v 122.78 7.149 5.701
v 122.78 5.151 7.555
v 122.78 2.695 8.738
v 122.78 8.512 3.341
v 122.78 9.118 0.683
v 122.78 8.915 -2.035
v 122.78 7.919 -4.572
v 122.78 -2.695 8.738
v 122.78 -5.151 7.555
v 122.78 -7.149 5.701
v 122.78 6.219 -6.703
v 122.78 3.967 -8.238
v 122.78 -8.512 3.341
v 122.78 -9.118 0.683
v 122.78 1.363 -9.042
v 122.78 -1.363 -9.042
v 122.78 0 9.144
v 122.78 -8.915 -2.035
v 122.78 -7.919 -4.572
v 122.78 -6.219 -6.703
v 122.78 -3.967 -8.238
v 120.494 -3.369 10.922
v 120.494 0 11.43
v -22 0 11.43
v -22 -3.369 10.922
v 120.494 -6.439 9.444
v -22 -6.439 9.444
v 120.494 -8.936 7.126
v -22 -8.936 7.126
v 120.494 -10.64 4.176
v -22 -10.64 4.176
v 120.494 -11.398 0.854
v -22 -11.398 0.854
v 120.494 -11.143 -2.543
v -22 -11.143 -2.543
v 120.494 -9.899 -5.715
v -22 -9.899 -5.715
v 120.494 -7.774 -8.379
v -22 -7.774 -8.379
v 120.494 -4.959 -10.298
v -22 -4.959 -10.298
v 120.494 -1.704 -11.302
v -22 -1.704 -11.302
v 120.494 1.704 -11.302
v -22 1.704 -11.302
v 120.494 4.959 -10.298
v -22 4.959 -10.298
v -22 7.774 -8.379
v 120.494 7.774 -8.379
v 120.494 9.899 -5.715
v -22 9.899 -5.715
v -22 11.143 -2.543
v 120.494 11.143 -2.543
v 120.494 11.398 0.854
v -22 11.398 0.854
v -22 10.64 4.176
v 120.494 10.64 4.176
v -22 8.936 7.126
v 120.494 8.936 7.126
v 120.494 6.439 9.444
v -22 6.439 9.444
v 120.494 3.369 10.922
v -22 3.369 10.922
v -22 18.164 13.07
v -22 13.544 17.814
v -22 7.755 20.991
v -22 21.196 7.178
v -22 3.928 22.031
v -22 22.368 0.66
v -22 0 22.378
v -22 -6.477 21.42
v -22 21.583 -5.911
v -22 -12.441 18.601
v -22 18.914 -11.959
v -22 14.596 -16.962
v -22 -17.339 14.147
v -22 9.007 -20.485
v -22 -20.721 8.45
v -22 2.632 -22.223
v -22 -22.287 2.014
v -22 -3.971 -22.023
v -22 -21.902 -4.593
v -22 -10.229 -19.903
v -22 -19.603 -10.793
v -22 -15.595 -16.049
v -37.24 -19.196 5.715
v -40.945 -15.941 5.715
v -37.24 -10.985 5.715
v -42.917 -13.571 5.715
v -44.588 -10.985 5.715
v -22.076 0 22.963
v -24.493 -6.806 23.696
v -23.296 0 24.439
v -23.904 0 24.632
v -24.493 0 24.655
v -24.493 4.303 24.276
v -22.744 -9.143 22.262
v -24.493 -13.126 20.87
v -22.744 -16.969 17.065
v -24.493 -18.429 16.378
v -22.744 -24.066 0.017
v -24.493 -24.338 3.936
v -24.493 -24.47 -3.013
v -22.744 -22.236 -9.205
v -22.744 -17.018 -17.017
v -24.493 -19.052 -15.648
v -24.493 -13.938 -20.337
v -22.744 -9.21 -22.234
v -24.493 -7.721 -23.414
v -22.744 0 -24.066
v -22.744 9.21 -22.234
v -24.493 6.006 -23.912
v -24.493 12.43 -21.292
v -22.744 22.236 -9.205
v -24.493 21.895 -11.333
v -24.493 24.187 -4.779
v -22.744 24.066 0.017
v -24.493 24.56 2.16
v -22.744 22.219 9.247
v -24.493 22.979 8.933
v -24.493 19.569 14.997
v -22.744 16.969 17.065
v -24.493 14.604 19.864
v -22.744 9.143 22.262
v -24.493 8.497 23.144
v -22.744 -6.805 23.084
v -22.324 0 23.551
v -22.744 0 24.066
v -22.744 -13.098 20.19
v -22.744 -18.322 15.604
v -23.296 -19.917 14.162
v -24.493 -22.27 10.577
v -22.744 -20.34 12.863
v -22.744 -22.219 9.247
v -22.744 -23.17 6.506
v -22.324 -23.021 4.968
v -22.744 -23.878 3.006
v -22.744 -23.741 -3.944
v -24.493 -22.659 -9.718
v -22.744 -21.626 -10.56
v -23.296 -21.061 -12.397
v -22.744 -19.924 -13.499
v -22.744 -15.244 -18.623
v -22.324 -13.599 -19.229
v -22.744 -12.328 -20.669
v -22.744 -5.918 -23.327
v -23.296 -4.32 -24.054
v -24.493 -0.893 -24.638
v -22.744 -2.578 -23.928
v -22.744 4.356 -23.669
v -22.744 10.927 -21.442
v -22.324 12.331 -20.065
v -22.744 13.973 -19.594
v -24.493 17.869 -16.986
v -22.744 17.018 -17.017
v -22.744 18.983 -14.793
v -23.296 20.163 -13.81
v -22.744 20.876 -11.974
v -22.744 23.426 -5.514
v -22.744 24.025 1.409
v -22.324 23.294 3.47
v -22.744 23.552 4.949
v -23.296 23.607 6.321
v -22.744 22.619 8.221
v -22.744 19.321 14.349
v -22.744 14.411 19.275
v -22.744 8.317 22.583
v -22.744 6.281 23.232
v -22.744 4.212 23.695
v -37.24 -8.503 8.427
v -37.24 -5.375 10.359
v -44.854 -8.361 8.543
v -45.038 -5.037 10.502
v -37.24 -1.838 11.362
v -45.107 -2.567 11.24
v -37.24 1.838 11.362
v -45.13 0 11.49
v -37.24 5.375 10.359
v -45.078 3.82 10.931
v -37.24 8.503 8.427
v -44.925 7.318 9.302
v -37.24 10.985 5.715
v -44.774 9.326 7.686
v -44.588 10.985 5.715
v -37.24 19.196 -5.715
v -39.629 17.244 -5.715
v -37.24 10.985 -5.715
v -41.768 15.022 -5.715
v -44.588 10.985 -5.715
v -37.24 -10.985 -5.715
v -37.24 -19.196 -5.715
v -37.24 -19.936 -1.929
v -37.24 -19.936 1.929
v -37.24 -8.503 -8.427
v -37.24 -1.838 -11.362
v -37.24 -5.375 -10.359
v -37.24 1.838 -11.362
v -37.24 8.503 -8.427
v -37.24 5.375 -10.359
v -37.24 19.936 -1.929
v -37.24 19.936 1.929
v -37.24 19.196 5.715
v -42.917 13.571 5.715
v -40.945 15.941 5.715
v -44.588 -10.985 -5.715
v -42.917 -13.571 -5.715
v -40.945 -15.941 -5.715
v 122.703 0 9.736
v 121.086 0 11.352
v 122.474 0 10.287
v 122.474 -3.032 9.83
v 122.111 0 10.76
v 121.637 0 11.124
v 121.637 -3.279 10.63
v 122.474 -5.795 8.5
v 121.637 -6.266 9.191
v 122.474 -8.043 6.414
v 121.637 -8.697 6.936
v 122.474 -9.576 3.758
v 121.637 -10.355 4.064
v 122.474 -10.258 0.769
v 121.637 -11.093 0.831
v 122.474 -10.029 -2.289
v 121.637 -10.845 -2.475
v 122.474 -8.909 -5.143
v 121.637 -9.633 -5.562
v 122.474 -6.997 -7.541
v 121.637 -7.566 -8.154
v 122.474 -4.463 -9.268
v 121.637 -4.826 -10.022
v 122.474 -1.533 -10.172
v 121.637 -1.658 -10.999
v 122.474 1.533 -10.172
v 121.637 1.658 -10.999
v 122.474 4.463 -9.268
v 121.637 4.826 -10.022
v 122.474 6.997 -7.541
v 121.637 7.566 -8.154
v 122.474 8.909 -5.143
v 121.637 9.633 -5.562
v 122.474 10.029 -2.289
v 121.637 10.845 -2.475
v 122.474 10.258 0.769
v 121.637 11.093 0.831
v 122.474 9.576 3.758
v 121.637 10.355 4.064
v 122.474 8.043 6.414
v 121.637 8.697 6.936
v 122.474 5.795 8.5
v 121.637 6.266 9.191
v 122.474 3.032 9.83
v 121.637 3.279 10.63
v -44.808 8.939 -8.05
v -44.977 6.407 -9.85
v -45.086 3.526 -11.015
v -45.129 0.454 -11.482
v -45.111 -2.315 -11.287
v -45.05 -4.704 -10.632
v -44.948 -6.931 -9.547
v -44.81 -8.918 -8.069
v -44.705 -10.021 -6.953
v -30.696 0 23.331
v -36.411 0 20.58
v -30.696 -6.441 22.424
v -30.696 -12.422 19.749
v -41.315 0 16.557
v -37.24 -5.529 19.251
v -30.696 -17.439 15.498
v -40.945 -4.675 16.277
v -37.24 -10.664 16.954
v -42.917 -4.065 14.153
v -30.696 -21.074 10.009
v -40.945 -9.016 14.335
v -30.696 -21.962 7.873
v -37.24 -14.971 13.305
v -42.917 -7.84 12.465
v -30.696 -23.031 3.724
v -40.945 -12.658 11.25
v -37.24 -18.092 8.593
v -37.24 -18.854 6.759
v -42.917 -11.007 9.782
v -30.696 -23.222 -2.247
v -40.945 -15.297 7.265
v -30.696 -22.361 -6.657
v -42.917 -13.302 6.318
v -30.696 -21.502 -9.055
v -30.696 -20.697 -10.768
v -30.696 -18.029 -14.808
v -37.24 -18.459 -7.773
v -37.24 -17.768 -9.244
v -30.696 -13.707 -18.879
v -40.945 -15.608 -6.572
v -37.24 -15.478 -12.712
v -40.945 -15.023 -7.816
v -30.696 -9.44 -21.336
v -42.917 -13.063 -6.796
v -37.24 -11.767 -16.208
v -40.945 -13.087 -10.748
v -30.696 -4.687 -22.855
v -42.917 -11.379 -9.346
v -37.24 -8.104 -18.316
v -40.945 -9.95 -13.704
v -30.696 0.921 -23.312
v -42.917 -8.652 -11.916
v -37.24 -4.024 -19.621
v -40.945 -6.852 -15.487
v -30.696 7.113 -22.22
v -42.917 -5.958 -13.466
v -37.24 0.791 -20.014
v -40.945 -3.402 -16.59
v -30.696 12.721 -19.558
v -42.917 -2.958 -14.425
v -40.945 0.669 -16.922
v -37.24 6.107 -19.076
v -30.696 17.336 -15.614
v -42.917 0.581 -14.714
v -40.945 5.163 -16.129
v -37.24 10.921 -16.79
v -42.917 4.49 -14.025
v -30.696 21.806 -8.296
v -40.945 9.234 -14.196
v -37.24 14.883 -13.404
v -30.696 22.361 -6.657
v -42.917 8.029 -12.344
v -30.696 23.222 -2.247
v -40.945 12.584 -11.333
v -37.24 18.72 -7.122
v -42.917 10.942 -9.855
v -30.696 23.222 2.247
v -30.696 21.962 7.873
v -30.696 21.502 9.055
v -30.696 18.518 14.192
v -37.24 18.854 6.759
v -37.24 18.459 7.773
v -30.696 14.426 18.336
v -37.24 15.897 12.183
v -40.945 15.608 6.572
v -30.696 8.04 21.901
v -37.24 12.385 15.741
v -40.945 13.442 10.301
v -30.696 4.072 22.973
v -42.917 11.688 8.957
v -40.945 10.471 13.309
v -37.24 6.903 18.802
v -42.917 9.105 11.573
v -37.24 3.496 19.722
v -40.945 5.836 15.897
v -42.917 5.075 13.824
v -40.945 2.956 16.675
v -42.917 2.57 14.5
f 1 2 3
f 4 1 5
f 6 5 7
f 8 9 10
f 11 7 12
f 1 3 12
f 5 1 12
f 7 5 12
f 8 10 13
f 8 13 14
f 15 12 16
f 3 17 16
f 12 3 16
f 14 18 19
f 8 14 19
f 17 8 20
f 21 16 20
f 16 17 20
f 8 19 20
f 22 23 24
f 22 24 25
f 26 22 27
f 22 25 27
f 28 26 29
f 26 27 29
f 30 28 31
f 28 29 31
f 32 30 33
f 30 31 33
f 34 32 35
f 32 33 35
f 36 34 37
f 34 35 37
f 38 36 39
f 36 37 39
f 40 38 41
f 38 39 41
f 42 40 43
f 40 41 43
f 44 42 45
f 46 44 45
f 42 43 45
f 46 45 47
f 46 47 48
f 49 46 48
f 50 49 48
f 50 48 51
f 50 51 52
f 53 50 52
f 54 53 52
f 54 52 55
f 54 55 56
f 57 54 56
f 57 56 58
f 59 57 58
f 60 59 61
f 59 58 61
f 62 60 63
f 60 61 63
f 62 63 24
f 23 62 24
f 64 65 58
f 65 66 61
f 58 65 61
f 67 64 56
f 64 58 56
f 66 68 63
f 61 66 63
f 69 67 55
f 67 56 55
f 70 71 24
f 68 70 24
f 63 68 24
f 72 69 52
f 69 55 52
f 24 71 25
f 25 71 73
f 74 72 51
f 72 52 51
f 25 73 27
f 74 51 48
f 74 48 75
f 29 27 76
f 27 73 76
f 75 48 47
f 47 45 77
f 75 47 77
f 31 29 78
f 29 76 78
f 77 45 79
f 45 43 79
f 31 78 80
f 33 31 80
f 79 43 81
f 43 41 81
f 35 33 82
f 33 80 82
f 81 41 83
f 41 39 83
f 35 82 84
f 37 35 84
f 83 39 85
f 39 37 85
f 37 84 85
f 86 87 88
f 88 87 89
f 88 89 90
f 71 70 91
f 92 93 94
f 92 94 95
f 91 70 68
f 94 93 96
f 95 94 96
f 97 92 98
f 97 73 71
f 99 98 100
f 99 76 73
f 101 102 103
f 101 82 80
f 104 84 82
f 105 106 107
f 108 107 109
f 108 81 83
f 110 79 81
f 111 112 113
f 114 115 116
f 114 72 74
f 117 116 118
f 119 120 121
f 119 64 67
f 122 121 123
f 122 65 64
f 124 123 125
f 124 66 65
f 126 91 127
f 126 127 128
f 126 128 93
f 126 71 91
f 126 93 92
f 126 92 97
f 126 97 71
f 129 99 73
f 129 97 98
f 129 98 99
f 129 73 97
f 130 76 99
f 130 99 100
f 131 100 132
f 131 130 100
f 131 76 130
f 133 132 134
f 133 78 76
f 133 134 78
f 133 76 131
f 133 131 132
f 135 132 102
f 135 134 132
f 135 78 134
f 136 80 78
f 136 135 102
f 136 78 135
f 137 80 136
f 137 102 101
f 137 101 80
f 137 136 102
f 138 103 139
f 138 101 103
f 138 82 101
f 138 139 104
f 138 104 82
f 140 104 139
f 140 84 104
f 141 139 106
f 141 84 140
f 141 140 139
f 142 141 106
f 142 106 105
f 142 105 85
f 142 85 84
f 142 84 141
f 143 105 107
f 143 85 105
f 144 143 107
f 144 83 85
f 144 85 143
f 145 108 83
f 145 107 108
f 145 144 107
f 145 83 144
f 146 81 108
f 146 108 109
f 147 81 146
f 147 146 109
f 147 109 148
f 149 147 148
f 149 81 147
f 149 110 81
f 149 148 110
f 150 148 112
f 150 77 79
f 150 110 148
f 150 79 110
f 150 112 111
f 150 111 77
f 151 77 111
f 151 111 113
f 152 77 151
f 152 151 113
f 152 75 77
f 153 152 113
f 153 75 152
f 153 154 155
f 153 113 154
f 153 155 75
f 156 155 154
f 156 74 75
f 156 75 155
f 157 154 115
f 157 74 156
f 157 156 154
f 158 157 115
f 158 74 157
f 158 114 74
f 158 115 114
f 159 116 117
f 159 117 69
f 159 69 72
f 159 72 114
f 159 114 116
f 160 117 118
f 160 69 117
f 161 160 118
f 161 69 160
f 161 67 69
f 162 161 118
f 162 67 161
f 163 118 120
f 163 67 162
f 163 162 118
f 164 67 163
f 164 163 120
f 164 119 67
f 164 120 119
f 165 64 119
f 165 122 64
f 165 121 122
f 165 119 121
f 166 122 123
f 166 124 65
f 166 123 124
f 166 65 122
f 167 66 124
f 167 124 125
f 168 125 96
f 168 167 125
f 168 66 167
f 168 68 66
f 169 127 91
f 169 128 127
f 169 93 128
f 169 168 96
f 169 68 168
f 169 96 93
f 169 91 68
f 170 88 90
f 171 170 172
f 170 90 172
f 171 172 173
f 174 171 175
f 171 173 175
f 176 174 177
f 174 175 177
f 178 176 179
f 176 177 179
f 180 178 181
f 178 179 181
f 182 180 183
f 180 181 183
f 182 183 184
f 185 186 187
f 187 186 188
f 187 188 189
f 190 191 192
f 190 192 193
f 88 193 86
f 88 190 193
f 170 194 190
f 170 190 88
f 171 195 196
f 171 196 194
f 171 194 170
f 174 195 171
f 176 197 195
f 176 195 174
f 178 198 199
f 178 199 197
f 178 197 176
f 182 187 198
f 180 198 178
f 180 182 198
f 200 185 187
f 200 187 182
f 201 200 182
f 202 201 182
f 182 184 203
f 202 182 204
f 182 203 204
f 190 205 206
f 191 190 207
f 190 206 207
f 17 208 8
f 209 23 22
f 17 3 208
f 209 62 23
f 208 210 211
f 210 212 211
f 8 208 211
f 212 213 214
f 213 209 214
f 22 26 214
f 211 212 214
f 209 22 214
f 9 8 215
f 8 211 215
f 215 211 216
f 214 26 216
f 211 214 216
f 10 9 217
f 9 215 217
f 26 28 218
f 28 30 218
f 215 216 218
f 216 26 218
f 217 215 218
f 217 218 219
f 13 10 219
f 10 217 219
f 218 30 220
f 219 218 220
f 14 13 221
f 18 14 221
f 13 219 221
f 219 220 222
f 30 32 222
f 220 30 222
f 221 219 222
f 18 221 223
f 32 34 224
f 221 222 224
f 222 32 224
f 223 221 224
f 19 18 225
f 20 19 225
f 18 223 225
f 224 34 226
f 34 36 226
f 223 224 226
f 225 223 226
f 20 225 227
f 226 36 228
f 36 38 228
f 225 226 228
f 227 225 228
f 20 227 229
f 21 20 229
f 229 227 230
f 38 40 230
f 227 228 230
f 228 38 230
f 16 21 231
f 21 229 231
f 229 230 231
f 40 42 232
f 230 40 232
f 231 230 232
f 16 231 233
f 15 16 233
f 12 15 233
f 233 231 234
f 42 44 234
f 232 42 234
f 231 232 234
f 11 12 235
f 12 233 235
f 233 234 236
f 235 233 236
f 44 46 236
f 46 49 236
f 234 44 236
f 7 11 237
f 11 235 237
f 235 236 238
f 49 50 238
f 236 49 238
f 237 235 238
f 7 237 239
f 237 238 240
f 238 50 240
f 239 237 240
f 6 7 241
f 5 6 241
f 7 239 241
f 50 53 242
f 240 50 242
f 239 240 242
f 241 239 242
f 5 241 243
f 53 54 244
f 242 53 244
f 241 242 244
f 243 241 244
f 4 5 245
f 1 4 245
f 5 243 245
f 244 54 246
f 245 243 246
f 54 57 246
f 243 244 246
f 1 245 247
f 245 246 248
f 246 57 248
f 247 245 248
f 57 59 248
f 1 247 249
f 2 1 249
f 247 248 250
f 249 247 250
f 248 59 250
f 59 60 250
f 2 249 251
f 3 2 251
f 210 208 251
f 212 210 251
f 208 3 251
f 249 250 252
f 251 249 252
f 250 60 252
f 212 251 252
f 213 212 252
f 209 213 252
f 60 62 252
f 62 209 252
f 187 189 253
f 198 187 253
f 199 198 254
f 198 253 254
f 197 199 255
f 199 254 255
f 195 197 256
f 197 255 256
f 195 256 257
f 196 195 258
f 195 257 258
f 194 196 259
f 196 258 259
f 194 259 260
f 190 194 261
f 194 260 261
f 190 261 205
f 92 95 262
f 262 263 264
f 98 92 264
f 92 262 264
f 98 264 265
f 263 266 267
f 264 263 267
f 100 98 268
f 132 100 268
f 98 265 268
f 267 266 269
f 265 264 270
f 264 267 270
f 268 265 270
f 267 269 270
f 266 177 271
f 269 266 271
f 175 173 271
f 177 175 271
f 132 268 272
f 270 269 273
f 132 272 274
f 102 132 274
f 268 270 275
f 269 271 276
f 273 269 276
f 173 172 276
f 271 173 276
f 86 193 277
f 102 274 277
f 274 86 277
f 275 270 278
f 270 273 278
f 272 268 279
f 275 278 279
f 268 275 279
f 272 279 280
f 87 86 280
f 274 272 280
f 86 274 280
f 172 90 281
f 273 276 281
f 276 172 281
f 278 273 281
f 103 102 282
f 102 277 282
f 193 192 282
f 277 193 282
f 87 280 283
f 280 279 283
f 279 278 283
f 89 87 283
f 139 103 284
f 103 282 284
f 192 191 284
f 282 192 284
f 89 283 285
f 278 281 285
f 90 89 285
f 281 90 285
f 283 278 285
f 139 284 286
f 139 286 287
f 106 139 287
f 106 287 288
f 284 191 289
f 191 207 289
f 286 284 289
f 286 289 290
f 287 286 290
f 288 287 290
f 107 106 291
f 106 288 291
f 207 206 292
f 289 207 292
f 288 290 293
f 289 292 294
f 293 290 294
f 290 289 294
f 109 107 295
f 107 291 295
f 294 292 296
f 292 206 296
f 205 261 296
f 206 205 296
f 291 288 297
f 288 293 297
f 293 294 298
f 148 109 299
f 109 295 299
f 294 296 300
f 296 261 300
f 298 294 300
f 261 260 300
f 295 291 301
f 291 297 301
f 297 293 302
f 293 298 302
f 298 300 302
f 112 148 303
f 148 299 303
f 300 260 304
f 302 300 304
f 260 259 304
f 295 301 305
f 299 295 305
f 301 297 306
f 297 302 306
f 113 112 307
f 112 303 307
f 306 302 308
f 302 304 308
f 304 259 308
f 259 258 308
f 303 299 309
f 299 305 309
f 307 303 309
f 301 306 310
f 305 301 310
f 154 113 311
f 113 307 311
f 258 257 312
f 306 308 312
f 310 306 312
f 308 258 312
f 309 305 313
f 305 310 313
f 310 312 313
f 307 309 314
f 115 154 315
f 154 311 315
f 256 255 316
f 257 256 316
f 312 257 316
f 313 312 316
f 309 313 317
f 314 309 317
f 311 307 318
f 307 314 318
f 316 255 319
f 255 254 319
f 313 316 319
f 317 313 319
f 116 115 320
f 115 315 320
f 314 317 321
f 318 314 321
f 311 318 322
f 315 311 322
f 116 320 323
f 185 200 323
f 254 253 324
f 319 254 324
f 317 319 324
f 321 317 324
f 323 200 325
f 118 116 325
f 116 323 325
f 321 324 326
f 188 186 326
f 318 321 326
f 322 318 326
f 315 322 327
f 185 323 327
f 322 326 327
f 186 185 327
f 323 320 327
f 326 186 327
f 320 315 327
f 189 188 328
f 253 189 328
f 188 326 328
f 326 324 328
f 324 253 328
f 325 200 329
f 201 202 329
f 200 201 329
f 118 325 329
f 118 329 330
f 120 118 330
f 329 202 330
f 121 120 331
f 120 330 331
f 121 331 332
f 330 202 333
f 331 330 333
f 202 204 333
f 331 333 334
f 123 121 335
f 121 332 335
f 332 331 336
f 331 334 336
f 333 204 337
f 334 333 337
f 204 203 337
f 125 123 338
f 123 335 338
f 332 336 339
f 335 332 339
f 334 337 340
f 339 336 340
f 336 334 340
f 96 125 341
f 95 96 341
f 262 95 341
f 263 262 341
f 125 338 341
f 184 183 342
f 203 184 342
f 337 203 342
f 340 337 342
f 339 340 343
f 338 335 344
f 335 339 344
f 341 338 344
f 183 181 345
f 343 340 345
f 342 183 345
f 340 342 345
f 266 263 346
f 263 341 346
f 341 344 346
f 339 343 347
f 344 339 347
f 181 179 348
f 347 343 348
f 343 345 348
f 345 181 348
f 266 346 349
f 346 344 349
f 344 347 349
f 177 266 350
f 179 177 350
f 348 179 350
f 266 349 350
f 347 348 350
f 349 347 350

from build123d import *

# Parameters (mm, degrees)
CUT_EXTRUDE1_DEPTH = 3.81
FILLET1_R          = 0.762
SCALE1_SCALE       = 3


with BuildPart() as part:
    # Sketch1 → Revolve1 (revolve)
    with BuildSketch(Plane.XY, mode=Mode.PRIVATE) as revolve1_sk:
        with BuildLine():
            Line((0, 0), (57.15, 0))
            Line((57.15, 0), (57.15, 3.81))
            Line((57.15, 3.81), (8.89, 3.81))
            Line((8.89, 3.81), (8.89, 8.255))
            ThreePointArc((8.89, 8.255), (2.818084231, 5.879563136), (0, 0))
        make_face()
    revolve(revolve1_sk.sketch.rotate(Axis((0, 0, 0), (1, 0, 0)), 90), axis=Axis((0, 0, 0), (1, 0, 0)))

    # Sketch3 → Cut-Extrude1 (cut)
    with BuildSketch(Plane(origin=(0, 0, 0), x_dir=(0, 0, -1), z_dir=(1, 0, 0))):
        with BuildLine():
            Line((1.905, -3.661588624), (1.905, -6.985))
            Line((1.905, -6.985), (-1.905, -6.985))
            Line((-1.905, -6.985), (-1.905, -3.661588624))
            ThreePointArc((-1.905, -3.661588624), (-3.829921876, 0), (-1.905, 3.661588624))
            Line((-1.905, 3.661588624), (-1.905, 6.985))
            Line((-1.905, 6.985), (1.905, 6.985))
            Line((1.905, 6.985), (1.905, 3.661588624))
            ThreePointArc((1.905, 3.661588624), (3.829921876, 0), (1.905, -3.661588624))
        make_face()
    extrude(amount=CUT_EXTRUDE1_DEPTH, mode=Mode.SUBTRACT)

    # Fillet1
    fillet1_edges = [part.edges().sort_by_distance(p)[0] for p in [
        (8.89, 0, -8.255),
        (57.15, 0, -3.81),
    ]]
    fillet(fillet1_edges, radius=FILLET1_R)


with BuildPart() as part_1:
    # Scale1: scaled about (24.334751601, 6e-09, -5e-09)
    add(part.part.scale(SCALE1_SCALE).moved(Location((-48.669503202, -1.2e-08, 1e-08))))


solid = part_1.part
